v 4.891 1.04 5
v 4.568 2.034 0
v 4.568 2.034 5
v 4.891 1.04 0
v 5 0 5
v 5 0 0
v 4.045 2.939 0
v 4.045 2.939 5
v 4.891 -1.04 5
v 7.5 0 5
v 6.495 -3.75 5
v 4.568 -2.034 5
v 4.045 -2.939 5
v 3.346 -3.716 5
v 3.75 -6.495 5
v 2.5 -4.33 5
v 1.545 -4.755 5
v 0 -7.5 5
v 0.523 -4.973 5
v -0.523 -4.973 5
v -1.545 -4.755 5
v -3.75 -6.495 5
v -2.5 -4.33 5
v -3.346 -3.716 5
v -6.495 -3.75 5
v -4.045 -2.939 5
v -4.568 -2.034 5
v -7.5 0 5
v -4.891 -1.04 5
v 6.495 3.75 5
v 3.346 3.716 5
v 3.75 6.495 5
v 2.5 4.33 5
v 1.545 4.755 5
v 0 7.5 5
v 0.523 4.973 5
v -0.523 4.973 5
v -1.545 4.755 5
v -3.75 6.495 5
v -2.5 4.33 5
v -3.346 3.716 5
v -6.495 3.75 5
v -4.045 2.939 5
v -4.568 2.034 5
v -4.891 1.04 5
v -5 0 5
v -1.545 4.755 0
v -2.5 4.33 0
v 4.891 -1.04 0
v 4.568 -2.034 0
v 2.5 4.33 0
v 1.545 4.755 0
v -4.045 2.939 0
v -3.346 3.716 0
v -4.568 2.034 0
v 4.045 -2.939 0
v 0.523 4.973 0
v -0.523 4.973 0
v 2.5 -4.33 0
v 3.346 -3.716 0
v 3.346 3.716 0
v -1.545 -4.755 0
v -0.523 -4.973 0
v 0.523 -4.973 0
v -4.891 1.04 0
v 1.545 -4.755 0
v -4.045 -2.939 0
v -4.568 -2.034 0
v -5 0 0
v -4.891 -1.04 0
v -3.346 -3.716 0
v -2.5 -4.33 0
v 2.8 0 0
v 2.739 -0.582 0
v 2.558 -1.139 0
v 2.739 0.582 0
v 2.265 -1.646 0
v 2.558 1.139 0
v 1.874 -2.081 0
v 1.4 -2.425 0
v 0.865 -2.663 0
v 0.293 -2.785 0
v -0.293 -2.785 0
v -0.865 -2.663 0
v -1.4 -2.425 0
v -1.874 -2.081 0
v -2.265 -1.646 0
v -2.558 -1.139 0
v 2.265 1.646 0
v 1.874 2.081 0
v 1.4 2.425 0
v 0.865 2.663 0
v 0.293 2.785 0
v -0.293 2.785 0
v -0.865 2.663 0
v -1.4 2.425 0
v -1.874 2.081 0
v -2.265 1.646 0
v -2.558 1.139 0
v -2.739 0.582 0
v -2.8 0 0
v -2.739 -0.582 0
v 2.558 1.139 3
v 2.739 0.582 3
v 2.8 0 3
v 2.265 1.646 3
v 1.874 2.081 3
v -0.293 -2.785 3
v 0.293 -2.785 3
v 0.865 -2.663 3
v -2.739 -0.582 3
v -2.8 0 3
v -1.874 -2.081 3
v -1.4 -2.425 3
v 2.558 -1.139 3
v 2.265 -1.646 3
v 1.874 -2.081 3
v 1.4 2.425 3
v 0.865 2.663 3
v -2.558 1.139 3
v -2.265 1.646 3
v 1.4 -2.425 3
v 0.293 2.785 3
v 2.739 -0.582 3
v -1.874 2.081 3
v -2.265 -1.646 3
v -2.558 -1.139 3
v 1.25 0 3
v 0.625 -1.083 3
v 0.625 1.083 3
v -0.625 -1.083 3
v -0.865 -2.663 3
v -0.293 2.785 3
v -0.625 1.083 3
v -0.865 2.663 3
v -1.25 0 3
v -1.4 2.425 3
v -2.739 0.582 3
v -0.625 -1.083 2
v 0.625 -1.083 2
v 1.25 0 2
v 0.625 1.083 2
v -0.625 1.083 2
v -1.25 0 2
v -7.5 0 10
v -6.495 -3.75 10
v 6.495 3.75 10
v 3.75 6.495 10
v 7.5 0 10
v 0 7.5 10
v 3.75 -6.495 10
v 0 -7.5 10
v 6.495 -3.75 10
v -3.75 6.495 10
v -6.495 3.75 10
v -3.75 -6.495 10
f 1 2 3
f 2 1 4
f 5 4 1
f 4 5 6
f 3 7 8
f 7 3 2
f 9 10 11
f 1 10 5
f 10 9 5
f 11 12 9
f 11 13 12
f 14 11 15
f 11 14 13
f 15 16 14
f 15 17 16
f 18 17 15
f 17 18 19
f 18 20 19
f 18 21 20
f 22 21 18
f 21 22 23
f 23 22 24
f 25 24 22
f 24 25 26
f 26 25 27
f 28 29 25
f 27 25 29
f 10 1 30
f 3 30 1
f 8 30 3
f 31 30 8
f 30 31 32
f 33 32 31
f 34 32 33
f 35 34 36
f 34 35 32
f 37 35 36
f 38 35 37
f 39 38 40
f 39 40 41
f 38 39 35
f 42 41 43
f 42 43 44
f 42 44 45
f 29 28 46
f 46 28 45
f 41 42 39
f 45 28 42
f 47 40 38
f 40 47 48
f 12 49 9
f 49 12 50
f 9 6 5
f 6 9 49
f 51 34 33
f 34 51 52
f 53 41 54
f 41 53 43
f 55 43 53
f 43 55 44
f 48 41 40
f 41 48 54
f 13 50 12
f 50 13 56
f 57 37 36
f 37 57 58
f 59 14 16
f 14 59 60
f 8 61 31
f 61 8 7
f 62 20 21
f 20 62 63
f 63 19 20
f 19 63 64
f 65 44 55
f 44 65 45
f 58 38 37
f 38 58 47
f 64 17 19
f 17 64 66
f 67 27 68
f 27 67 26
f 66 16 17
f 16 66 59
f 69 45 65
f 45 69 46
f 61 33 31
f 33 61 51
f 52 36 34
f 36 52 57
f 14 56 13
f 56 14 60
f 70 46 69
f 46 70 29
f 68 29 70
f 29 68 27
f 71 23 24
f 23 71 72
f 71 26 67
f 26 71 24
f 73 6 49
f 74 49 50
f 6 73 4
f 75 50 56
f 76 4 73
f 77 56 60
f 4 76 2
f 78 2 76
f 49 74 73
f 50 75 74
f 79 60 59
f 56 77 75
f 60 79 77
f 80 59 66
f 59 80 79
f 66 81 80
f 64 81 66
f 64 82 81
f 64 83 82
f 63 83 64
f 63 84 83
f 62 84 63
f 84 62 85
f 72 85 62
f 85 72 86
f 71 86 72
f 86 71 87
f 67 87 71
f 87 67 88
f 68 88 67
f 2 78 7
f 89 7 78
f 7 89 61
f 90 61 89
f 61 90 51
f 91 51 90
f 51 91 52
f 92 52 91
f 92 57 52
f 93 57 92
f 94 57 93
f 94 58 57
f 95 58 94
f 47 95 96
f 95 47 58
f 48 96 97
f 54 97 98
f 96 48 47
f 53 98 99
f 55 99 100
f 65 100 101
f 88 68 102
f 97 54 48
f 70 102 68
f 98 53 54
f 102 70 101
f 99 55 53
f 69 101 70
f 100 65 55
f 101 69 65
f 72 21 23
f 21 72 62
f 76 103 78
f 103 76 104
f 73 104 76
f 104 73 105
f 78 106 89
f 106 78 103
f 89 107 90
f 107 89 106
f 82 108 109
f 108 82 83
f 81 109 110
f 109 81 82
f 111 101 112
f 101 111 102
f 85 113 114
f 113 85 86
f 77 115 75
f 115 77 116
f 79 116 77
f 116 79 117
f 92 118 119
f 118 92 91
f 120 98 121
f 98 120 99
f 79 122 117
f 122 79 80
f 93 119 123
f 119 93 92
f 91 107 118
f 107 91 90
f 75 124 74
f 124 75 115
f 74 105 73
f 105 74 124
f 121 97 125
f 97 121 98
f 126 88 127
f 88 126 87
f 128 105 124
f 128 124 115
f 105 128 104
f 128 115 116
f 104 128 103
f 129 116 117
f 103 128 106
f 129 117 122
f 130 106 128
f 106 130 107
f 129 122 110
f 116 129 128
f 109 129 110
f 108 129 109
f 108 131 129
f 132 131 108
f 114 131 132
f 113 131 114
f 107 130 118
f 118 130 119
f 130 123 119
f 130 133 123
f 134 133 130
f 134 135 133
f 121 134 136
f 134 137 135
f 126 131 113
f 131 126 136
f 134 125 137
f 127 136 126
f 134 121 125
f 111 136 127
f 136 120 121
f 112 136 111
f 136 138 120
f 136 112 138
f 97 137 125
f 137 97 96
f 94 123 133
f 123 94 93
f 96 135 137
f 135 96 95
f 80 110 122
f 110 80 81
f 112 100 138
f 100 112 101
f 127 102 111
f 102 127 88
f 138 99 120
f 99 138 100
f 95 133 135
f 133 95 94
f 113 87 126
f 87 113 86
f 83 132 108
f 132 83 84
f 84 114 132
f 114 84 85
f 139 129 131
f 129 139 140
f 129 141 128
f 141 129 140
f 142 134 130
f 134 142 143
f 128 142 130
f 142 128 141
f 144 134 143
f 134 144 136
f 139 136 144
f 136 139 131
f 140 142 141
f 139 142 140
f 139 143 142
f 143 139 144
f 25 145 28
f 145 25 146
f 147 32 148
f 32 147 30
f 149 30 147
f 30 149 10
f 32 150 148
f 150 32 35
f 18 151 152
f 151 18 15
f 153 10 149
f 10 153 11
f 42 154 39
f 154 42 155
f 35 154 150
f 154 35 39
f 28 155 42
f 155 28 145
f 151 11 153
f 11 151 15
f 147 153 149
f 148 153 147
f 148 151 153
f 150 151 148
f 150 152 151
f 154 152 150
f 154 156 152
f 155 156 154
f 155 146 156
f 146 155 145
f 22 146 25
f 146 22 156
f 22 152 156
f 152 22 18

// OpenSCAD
echo(version=version());
// Knob to replace lost part on fishing reel.

$fs=0.5;
module reelKnob() {
	// Simplest form is three cylinders.

	difference() {
		// Inner knob; sits inside the sleeve on the reel.
		cylinder(r=10/2, h=5, center=false);

		// Hole for head of bolt
		translate([0, 0, -1]) {
			cylinder(r=5.6/2, h=3+1, center=false);
		}
	}

	// Hex inset into bolt head
	translate([0, 0, 3-1]) {
		cylinder(r=2.5/2, h=1, center=false, $fn=6);
	}

	// add another outter most cylinder for where your fingers grab?
	translate([0, 0, 5]) {
		cylinder(r=15/2, h=5, center=false, $fn=12);
	}
}

reelKnob();
